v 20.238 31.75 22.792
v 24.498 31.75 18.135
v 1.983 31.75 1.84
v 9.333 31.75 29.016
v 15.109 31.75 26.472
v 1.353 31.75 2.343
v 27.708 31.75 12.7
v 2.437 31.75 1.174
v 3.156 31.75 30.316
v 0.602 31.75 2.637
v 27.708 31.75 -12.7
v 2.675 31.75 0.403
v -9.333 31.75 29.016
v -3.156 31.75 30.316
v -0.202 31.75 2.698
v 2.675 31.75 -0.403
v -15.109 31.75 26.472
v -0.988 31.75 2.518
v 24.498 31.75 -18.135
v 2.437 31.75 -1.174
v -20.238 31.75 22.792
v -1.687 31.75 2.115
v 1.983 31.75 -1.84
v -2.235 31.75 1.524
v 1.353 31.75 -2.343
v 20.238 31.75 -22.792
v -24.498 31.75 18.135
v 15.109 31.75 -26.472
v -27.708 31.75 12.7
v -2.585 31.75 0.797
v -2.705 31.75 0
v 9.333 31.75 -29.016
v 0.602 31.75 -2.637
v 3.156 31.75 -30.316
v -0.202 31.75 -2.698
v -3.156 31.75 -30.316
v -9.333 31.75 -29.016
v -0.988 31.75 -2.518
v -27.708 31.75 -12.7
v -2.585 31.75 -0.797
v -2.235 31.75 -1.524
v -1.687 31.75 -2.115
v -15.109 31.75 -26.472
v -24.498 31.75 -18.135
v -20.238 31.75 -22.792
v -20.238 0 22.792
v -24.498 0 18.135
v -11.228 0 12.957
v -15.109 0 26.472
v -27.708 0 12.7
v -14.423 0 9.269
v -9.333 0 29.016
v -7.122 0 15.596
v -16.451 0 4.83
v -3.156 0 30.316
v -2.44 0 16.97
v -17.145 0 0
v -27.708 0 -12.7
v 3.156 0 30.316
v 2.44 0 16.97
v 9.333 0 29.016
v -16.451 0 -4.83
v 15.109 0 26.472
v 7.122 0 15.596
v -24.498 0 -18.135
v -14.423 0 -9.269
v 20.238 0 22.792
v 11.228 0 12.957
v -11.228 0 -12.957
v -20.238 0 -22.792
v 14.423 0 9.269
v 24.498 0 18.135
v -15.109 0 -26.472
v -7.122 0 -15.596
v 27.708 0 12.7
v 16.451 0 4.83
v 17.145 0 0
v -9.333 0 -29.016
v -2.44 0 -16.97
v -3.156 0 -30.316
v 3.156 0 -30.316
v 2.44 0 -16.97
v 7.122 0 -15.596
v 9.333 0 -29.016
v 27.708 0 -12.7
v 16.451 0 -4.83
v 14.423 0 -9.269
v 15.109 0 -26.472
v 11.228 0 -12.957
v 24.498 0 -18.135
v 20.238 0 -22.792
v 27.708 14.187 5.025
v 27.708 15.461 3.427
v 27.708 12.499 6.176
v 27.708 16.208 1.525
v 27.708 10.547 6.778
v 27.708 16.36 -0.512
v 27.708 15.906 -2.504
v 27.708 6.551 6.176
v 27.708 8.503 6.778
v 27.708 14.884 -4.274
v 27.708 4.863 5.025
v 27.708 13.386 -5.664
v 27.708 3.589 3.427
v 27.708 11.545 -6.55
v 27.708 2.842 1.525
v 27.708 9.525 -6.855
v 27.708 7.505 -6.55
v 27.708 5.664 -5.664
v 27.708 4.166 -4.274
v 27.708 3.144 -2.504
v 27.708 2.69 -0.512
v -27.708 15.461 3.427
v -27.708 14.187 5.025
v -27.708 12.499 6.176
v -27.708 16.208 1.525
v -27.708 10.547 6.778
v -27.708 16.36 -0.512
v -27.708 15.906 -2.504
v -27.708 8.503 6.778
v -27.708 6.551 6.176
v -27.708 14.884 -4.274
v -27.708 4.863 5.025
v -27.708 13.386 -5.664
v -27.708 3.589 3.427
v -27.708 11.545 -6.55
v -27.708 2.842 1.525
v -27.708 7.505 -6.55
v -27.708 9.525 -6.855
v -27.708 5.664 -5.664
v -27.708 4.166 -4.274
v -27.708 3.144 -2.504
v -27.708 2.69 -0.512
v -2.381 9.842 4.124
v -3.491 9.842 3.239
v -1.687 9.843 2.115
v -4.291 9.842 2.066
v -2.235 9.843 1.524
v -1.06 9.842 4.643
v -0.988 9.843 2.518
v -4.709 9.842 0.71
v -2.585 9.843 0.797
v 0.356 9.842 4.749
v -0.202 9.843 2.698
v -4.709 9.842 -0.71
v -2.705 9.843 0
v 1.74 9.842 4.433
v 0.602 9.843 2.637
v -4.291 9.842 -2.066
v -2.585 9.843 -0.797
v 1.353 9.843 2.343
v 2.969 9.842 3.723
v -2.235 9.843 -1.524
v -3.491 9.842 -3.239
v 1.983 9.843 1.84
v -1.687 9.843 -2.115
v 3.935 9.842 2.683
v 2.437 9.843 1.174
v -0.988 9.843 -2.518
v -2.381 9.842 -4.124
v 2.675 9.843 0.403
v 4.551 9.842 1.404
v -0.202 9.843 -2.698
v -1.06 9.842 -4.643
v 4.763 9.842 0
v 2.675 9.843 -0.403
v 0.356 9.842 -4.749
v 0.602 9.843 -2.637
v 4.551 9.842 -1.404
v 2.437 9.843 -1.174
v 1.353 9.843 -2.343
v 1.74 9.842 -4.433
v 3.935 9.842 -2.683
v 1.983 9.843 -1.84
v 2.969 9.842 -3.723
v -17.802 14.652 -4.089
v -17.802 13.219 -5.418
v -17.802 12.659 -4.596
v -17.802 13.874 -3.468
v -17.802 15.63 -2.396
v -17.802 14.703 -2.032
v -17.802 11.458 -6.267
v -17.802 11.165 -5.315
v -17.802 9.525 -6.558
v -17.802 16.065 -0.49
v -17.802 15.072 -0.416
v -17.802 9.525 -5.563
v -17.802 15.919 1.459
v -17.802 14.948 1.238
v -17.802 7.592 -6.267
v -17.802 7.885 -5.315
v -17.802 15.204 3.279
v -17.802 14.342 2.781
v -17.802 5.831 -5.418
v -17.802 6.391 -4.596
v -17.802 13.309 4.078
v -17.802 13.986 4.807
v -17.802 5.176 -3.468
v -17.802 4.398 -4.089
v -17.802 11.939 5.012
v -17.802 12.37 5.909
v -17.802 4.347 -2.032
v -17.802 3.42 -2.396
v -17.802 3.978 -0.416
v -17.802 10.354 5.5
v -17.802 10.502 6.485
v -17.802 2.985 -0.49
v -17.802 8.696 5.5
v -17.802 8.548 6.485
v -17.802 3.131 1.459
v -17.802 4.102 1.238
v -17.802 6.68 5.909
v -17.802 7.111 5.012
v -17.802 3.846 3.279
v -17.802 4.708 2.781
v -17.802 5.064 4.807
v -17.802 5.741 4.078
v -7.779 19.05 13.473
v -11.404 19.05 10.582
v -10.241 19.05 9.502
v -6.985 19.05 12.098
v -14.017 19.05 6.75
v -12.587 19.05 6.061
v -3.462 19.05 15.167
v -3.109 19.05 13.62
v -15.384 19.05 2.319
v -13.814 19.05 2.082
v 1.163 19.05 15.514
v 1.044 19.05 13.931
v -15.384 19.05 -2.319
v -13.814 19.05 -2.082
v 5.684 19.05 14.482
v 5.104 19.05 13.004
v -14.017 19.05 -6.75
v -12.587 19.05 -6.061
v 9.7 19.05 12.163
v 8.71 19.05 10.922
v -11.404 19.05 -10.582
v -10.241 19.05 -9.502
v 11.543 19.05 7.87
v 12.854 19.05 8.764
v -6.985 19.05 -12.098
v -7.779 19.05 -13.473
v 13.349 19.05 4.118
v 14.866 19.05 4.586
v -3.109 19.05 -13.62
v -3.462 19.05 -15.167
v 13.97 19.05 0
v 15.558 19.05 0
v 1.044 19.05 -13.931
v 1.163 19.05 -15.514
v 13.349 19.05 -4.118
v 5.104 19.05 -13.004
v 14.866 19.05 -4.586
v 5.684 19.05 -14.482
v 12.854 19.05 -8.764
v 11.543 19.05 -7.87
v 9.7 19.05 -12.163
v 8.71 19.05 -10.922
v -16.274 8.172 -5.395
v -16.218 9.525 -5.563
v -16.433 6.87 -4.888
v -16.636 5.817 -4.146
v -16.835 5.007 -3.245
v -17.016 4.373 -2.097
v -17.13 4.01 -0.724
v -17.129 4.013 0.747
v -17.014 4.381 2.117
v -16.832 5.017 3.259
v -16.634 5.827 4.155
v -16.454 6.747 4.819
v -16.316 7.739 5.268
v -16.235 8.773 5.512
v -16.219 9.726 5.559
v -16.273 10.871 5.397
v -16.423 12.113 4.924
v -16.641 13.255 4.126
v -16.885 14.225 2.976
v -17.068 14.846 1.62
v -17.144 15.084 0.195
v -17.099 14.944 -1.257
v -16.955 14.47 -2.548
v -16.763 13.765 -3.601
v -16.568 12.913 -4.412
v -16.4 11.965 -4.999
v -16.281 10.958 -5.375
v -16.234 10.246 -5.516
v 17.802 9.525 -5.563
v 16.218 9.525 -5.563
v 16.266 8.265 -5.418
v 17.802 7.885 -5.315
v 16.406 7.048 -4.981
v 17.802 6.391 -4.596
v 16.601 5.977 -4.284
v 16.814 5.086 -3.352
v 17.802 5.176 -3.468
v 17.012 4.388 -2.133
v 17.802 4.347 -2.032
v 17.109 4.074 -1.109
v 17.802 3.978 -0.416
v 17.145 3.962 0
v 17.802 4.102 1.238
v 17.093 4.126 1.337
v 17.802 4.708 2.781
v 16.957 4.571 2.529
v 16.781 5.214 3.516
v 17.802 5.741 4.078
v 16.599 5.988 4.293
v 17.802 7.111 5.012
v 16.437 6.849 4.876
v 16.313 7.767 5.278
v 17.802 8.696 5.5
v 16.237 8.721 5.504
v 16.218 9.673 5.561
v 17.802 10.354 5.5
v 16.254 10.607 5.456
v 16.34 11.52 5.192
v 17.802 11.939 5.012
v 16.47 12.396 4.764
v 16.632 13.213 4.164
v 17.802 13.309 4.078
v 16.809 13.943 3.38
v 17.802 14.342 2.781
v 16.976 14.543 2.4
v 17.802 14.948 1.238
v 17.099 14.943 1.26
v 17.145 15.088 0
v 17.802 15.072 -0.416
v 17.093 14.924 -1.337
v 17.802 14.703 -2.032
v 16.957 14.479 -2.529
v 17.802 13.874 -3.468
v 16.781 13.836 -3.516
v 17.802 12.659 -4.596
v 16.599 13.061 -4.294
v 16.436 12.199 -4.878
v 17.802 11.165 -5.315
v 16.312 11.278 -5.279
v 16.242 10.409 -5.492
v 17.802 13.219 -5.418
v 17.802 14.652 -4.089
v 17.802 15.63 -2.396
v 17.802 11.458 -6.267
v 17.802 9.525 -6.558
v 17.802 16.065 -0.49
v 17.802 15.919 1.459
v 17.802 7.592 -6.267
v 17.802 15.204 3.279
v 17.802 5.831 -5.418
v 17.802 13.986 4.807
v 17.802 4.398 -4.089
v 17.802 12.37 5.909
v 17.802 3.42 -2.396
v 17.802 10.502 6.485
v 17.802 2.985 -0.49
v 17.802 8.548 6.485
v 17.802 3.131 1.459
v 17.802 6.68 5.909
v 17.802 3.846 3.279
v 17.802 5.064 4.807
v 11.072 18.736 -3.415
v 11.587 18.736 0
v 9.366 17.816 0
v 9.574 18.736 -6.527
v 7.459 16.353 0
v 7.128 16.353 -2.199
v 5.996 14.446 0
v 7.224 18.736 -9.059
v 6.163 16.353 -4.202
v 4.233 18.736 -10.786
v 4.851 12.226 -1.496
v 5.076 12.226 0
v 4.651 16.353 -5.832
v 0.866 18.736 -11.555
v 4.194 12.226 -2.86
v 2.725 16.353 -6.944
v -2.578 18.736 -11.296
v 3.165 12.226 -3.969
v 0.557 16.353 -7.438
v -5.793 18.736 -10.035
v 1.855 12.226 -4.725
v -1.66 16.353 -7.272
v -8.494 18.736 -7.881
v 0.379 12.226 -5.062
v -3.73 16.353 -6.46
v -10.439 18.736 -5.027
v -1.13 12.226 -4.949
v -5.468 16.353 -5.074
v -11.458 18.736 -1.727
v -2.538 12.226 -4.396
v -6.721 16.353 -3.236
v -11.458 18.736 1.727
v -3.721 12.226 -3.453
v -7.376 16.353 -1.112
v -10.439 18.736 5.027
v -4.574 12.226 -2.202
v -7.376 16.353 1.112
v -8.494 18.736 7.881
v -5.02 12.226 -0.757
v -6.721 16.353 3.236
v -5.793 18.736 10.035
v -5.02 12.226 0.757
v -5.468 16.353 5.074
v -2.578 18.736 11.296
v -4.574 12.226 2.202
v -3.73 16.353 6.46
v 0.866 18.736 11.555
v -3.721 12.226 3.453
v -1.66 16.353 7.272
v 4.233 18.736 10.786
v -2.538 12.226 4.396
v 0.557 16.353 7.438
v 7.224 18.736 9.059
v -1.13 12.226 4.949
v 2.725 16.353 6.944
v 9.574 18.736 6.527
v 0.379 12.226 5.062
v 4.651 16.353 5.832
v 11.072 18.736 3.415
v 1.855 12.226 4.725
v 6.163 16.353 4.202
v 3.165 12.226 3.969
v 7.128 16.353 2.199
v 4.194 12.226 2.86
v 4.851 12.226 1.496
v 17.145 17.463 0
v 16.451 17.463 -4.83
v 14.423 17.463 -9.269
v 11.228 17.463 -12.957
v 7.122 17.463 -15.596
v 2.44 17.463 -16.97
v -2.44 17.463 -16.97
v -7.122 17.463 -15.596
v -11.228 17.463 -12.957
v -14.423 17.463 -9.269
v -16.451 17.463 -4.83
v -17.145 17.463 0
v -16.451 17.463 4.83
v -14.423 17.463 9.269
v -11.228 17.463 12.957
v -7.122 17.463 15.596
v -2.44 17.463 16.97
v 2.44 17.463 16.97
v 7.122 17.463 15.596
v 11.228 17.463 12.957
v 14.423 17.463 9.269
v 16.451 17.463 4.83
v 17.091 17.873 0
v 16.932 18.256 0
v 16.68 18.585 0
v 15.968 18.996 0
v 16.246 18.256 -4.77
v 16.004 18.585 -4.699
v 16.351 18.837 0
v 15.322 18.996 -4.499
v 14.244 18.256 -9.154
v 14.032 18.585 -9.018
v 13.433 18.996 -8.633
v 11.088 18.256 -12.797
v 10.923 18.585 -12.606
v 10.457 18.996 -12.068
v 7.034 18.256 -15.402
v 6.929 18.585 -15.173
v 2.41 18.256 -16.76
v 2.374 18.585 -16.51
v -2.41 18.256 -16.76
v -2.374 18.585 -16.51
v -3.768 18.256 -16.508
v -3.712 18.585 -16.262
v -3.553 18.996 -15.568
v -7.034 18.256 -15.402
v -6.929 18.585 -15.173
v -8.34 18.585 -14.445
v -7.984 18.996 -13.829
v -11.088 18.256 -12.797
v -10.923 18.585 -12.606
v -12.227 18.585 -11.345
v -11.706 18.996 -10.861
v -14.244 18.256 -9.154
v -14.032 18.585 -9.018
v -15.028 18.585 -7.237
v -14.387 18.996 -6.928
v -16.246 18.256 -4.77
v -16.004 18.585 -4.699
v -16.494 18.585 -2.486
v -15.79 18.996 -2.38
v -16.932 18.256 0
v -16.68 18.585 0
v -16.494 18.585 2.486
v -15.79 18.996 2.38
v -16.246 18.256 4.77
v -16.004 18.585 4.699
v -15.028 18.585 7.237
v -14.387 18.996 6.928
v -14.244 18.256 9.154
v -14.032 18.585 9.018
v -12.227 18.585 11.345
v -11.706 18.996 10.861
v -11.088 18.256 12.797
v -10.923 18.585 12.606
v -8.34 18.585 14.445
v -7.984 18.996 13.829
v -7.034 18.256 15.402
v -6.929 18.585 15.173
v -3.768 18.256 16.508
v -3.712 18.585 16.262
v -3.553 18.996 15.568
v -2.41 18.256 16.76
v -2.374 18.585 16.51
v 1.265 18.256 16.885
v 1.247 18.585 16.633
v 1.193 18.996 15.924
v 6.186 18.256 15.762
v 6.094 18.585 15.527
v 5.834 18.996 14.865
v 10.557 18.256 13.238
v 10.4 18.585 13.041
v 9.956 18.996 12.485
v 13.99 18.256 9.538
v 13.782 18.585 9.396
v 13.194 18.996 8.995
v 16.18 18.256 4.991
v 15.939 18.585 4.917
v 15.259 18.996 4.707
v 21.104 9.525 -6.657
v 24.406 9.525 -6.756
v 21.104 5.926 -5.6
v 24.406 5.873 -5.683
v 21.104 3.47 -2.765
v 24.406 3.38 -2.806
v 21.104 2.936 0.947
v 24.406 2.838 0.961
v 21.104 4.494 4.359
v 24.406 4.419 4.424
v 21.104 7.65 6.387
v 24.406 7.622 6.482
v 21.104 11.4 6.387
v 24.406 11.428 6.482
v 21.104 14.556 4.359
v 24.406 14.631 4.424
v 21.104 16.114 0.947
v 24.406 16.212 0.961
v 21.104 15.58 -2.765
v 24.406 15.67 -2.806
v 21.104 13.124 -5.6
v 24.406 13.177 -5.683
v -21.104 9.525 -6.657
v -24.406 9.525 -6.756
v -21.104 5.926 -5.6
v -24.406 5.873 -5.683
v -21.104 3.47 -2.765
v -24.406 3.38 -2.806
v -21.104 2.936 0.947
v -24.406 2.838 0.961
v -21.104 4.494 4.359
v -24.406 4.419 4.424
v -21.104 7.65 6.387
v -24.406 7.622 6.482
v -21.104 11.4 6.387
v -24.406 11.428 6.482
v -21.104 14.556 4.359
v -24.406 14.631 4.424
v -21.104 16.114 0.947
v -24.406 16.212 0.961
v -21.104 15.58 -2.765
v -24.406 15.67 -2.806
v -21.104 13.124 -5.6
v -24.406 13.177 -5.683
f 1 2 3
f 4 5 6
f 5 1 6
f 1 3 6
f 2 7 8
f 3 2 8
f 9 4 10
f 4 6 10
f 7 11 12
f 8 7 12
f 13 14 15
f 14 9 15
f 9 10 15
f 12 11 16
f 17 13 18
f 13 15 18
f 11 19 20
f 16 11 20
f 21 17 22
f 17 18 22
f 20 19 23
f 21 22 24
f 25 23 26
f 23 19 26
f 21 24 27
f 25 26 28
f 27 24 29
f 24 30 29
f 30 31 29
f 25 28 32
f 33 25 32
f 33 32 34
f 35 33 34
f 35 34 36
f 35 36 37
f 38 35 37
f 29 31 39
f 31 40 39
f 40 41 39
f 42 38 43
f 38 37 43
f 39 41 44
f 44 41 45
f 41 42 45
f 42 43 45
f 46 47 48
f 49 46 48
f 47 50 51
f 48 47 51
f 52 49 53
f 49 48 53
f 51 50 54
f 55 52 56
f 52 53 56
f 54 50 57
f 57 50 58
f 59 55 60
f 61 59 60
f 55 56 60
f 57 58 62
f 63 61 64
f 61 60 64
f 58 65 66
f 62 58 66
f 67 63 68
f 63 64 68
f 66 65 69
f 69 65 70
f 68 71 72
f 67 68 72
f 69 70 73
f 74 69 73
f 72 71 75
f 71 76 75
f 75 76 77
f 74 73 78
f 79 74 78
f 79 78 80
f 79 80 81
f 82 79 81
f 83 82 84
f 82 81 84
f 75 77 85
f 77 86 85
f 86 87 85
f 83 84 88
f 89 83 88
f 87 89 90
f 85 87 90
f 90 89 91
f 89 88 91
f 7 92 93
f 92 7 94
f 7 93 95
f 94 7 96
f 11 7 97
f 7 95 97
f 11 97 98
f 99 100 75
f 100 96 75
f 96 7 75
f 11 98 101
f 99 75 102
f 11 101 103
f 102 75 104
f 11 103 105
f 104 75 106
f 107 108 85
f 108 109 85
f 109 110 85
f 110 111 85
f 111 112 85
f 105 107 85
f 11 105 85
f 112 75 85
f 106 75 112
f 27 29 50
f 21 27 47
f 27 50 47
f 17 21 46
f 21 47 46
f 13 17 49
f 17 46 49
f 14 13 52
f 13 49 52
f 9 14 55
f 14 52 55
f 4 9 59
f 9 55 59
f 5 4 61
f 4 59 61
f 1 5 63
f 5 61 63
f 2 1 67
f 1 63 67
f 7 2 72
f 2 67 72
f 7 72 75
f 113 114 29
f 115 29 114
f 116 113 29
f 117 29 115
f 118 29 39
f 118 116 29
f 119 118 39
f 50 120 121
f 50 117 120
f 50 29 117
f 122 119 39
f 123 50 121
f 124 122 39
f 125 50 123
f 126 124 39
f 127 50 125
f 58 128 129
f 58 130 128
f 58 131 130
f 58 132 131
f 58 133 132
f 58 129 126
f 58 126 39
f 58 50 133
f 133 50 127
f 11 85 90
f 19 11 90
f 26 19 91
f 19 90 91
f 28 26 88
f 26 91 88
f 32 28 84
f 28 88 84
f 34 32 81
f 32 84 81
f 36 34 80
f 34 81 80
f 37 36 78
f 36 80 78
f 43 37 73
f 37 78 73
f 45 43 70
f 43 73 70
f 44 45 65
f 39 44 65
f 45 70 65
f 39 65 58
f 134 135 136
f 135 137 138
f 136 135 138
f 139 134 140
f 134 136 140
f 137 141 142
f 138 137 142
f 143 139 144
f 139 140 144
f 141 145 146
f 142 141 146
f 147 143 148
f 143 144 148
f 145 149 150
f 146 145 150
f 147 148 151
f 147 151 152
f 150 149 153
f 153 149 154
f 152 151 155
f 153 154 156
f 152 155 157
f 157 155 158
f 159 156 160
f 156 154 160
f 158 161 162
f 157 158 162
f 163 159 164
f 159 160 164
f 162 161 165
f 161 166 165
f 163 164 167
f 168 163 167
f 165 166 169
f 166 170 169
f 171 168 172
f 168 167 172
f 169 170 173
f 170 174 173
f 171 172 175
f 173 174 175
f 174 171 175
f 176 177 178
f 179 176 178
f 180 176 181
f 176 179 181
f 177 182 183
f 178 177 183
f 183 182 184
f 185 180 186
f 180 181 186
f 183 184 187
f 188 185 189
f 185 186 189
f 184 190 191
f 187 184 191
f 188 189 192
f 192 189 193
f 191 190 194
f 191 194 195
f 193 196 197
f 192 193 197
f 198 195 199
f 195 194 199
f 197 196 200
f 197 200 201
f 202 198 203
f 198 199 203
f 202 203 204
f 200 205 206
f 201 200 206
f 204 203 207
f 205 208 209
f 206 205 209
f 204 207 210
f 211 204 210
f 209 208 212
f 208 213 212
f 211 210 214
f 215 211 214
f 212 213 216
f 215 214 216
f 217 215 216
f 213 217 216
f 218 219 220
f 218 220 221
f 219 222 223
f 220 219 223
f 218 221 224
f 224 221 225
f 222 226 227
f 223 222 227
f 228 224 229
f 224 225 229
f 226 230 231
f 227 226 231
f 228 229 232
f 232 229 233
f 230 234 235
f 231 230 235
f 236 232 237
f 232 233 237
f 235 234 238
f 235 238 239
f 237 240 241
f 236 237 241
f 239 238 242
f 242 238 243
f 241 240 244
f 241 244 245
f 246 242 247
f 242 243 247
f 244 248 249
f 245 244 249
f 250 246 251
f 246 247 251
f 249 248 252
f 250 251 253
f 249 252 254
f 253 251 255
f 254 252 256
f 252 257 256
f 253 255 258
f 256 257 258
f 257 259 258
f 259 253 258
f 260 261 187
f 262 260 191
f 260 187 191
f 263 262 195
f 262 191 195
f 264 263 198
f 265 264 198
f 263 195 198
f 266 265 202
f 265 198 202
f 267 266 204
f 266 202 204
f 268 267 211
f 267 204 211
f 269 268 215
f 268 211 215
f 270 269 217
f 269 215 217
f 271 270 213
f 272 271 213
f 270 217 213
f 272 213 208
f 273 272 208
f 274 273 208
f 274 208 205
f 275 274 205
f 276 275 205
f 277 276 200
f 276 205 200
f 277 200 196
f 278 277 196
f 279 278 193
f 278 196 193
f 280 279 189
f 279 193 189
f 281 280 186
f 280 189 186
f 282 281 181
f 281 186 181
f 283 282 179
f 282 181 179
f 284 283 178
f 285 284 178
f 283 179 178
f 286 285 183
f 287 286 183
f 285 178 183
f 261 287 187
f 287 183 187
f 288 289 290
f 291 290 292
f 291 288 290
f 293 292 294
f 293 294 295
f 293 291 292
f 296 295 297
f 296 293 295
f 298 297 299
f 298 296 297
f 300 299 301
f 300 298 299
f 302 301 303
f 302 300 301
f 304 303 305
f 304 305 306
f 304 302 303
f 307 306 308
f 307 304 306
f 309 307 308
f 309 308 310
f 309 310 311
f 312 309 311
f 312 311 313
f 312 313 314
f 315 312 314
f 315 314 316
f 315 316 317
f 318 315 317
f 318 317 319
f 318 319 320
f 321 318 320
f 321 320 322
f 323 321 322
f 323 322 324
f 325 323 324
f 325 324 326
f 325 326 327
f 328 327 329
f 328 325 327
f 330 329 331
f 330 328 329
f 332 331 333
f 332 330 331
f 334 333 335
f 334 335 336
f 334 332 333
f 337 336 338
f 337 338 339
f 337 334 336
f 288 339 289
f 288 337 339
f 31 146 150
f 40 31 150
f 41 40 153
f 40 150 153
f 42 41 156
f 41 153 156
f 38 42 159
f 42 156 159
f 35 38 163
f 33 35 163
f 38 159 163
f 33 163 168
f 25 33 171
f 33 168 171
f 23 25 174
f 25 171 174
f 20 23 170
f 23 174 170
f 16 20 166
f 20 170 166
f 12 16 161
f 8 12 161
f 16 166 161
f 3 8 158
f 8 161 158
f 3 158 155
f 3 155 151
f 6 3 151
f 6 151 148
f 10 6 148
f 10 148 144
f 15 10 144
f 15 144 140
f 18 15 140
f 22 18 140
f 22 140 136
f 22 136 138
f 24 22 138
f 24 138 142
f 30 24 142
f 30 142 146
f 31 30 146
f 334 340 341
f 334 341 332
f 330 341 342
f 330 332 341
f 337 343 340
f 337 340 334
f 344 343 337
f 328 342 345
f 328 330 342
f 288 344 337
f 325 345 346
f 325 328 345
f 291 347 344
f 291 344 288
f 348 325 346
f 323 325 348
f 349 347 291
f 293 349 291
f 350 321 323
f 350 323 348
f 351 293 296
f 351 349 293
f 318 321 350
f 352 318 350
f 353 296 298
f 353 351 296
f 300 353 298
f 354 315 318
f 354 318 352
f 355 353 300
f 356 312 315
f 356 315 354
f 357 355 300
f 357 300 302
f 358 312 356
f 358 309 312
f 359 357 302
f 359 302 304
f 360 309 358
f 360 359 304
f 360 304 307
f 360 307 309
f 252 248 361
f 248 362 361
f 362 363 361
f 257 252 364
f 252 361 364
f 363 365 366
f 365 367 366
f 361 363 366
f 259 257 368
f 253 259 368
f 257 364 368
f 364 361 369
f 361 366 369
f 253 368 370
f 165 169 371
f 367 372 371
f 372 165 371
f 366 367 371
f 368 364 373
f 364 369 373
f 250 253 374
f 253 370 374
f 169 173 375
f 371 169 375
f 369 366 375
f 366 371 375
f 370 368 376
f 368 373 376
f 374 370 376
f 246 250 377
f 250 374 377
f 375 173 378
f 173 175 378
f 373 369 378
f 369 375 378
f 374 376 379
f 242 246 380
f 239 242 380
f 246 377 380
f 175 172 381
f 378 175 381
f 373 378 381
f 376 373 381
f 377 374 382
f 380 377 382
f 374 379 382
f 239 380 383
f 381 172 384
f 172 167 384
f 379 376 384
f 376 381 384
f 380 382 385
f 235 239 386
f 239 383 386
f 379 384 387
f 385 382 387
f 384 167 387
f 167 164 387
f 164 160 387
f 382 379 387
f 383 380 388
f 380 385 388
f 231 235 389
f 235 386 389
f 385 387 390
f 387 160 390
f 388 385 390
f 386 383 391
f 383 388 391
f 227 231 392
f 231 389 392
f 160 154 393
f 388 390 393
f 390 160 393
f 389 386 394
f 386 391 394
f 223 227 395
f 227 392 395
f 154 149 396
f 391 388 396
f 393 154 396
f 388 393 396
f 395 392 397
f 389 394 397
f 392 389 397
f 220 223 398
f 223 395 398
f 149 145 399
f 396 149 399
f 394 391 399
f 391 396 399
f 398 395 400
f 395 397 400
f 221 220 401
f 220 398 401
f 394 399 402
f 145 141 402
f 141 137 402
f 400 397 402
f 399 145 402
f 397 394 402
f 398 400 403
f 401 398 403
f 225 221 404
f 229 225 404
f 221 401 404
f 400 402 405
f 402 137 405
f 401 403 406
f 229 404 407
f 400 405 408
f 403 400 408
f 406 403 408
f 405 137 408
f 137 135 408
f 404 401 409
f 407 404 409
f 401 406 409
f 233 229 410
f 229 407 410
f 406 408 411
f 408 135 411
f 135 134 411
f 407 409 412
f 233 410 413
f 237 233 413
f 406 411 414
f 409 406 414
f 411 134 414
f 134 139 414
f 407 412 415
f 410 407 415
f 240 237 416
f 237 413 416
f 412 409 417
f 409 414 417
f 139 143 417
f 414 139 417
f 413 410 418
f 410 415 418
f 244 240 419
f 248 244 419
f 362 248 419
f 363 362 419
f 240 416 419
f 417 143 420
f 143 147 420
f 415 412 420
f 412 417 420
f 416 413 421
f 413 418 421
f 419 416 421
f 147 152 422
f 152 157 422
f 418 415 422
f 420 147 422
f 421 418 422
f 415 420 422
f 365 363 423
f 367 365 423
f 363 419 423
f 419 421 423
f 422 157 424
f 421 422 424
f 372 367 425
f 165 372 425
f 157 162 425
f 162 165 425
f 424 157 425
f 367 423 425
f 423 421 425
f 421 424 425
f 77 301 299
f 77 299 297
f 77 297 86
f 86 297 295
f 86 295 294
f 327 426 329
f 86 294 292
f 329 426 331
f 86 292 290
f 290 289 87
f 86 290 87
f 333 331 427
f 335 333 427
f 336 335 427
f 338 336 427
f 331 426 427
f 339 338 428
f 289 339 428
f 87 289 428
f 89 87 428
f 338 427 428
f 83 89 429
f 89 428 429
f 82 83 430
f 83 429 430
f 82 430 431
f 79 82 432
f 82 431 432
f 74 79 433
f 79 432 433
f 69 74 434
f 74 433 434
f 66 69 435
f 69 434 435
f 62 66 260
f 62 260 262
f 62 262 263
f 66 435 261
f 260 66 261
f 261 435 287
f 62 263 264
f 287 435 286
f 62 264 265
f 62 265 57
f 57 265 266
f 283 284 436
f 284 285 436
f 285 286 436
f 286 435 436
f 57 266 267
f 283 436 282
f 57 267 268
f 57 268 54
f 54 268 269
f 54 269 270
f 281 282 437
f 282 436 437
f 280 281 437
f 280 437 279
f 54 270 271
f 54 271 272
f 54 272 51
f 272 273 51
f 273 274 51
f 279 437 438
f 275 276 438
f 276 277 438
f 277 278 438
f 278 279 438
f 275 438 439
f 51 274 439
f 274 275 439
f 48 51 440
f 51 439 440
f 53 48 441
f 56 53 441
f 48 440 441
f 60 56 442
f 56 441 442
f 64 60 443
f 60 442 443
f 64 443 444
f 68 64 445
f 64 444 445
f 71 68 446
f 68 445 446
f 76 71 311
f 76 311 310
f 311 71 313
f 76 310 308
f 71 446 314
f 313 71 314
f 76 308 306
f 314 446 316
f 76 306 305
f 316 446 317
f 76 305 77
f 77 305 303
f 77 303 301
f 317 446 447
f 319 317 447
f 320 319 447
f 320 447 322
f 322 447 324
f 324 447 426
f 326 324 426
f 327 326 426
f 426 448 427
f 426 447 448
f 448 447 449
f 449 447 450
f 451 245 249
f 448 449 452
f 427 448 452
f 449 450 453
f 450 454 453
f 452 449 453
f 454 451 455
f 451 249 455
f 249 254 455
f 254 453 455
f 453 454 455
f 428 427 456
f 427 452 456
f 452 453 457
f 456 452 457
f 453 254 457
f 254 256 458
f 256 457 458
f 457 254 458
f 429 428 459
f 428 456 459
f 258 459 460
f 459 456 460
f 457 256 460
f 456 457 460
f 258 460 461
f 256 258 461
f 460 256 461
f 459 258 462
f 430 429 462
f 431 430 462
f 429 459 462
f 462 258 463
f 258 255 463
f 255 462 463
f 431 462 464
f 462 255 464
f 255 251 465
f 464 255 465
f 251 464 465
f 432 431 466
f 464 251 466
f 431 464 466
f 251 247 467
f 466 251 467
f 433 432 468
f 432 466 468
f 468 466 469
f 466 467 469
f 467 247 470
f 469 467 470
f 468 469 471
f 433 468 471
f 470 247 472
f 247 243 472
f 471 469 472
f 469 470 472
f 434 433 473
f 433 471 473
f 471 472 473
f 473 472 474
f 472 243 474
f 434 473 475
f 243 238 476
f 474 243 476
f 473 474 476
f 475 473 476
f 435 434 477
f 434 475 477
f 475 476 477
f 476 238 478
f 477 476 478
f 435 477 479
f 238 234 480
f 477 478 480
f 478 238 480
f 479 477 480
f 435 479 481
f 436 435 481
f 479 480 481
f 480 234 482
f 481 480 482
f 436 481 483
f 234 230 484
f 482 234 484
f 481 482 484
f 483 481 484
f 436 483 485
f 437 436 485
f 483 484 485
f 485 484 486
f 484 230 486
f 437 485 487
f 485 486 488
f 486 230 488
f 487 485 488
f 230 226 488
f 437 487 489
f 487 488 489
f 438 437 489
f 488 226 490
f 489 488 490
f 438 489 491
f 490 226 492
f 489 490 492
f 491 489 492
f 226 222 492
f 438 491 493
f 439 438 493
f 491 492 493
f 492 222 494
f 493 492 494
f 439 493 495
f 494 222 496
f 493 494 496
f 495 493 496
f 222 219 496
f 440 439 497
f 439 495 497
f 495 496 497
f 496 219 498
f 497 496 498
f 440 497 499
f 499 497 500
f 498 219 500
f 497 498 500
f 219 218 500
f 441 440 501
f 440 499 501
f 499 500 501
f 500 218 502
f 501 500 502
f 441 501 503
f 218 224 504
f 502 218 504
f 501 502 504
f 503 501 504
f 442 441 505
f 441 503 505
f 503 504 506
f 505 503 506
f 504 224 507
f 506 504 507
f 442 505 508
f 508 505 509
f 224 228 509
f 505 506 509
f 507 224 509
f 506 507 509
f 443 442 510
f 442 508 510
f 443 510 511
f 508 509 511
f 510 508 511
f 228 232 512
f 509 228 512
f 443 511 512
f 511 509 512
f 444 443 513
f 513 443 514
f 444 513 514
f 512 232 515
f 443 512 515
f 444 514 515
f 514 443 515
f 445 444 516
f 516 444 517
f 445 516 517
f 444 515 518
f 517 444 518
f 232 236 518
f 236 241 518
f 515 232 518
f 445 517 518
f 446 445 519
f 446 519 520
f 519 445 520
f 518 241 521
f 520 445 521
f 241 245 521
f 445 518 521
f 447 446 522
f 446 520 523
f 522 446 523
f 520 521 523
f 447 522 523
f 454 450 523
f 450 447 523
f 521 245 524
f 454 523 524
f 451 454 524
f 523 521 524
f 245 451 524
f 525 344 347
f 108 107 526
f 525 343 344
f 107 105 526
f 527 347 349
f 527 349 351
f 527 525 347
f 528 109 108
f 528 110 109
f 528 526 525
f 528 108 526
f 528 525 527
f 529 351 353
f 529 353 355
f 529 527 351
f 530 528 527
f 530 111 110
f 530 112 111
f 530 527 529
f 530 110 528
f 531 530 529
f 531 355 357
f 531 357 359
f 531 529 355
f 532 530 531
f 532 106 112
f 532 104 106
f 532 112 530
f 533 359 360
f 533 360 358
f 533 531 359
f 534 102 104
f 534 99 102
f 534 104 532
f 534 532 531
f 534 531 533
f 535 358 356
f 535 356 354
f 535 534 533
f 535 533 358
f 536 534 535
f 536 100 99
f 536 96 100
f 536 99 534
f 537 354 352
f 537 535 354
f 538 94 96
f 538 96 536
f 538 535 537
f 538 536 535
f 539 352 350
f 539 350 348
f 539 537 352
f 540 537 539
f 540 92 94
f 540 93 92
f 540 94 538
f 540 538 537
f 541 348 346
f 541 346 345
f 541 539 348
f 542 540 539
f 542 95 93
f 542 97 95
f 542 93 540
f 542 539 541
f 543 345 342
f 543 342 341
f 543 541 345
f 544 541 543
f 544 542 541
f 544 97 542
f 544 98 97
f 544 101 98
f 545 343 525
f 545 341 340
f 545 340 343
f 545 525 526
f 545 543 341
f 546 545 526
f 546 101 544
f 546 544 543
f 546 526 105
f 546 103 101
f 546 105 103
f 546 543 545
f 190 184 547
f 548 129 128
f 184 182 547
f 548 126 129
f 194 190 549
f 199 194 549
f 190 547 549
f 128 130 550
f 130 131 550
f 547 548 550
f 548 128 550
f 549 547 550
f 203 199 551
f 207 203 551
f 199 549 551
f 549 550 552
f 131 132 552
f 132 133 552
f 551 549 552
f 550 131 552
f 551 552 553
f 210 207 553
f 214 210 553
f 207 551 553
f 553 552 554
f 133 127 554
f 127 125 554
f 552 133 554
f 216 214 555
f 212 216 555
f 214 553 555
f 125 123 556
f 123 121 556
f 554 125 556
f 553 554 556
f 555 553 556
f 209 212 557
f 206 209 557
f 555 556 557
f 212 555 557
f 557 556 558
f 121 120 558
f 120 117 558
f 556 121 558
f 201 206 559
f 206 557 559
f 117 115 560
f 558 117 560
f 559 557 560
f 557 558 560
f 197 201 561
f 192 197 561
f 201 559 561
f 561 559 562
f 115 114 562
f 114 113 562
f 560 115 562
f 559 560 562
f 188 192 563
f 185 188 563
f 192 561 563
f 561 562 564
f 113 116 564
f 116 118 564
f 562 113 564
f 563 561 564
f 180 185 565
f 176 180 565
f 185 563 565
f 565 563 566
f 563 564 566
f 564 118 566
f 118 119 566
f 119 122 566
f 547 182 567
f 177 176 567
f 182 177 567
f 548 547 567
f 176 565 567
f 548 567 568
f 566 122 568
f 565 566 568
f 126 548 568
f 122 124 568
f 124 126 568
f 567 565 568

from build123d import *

# Parameters (mm, degrees)
F_1_4_28_TAPPED_HOLE1_D = 5.4102
SKETCH4_W               = 25.4
SKETCH4_H               = 25.4
FLATS_DEPTH             = 54.536186827
FILLET1_R               = 1.5875


with BuildPart() as part:
    # Sketch1 → Revolve1 (revolve)
    with BuildSketch(Plane.XY, mode=Mode.PRIVATE) as revolve1_sk:
        with BuildLine():
            Line((0, 31.75), (-30.48, 31.75))
            Line((-30.48, 31.75), (-30.48, 0))
            Line((-30.48, 0), (-17.145, 0))
            Line((-17.145, 0), (-17.145, 19.05))
            Line((-17.145, 19.05), (-13.97, 19.05))
            ThreePointArc((-13.97, 19.05), (-7.459314312, 16.353185688), (-4.7625, 9.8425))
            Line((-4.7625, 9.8425), (0, 9.8425))
            Line((0, 9.8425), (0, 31.75))
        make_face()
    revolve(revolve1_sk.sketch.rotate(Axis((0, 0, 0), (0, 1, 0)), 180), axis=Axis((0, 0, 0), (0, 1, 0)))

    # 1/4-28 Tapped Hole1 (through all)
    with Locations(Plane(origin=(0, 31.75, 0), x_dir=(1, 0, 0), z_dir=(0, 1, 0))):
        with Locations((0, 0)):
            Hole(F_1_4_28_TAPPED_HOLE1_D / 2)

    # Sketch4 → flats (cut, through all)
    with BuildSketch(Plane(origin=(0, 0, 0), x_dir=(1, 0, 0), z_dir=(0, 1, 0))):
        with Locations((-40.408128771, 0)):
            Rectangle(SKETCH4_W, SKETCH4_H)
        with Locations((40.408128771, 0)):
            Rectangle(SKETCH4_W, SKETCH4_H)
    extrude(amount=FLATS_DEPTH, mode=Mode.SUBTRACT)

    # Sketch6 → 1/4 NPT Tapped Hole1 (revolve, cut)
    with BuildSketch(Plane(origin=(27.708128771, 9.525, 0), x_dir=(0, 0, -1), z_dir=(0, 1, 0))):
        Polygon((0, 0), (0, 20.614347279), (5.5626, 17.272), (5.5626, 9.906), (6.557984794, 9.906), (6.8545837, 0), align=None)
    f_1_4_npt_tapped_hole1 = revolve(axis=Axis((34.058128771, 9.525, 0), (-1, 0, 0)), mode=Mode.SUBTRACT)

    # Mirror1: 1/4 NPT Tapped Hole1 across plane
    add(f_1_4_npt_tapped_hole1.mirror(Plane(origin=(0, 0, 0), x_dir=(0, 0, 1), z_dir=(1, 0, 0))), mode=Mode.SUBTRACT)

    # Fillet1
    fillet1_edges = [part.edges().sort_by_distance(p)[0] for p in [
        (-17.145, 19.05, 0),
    ]]
    fillet(fillet1_edges, radius=FILLET1_R)


solid = part.part
